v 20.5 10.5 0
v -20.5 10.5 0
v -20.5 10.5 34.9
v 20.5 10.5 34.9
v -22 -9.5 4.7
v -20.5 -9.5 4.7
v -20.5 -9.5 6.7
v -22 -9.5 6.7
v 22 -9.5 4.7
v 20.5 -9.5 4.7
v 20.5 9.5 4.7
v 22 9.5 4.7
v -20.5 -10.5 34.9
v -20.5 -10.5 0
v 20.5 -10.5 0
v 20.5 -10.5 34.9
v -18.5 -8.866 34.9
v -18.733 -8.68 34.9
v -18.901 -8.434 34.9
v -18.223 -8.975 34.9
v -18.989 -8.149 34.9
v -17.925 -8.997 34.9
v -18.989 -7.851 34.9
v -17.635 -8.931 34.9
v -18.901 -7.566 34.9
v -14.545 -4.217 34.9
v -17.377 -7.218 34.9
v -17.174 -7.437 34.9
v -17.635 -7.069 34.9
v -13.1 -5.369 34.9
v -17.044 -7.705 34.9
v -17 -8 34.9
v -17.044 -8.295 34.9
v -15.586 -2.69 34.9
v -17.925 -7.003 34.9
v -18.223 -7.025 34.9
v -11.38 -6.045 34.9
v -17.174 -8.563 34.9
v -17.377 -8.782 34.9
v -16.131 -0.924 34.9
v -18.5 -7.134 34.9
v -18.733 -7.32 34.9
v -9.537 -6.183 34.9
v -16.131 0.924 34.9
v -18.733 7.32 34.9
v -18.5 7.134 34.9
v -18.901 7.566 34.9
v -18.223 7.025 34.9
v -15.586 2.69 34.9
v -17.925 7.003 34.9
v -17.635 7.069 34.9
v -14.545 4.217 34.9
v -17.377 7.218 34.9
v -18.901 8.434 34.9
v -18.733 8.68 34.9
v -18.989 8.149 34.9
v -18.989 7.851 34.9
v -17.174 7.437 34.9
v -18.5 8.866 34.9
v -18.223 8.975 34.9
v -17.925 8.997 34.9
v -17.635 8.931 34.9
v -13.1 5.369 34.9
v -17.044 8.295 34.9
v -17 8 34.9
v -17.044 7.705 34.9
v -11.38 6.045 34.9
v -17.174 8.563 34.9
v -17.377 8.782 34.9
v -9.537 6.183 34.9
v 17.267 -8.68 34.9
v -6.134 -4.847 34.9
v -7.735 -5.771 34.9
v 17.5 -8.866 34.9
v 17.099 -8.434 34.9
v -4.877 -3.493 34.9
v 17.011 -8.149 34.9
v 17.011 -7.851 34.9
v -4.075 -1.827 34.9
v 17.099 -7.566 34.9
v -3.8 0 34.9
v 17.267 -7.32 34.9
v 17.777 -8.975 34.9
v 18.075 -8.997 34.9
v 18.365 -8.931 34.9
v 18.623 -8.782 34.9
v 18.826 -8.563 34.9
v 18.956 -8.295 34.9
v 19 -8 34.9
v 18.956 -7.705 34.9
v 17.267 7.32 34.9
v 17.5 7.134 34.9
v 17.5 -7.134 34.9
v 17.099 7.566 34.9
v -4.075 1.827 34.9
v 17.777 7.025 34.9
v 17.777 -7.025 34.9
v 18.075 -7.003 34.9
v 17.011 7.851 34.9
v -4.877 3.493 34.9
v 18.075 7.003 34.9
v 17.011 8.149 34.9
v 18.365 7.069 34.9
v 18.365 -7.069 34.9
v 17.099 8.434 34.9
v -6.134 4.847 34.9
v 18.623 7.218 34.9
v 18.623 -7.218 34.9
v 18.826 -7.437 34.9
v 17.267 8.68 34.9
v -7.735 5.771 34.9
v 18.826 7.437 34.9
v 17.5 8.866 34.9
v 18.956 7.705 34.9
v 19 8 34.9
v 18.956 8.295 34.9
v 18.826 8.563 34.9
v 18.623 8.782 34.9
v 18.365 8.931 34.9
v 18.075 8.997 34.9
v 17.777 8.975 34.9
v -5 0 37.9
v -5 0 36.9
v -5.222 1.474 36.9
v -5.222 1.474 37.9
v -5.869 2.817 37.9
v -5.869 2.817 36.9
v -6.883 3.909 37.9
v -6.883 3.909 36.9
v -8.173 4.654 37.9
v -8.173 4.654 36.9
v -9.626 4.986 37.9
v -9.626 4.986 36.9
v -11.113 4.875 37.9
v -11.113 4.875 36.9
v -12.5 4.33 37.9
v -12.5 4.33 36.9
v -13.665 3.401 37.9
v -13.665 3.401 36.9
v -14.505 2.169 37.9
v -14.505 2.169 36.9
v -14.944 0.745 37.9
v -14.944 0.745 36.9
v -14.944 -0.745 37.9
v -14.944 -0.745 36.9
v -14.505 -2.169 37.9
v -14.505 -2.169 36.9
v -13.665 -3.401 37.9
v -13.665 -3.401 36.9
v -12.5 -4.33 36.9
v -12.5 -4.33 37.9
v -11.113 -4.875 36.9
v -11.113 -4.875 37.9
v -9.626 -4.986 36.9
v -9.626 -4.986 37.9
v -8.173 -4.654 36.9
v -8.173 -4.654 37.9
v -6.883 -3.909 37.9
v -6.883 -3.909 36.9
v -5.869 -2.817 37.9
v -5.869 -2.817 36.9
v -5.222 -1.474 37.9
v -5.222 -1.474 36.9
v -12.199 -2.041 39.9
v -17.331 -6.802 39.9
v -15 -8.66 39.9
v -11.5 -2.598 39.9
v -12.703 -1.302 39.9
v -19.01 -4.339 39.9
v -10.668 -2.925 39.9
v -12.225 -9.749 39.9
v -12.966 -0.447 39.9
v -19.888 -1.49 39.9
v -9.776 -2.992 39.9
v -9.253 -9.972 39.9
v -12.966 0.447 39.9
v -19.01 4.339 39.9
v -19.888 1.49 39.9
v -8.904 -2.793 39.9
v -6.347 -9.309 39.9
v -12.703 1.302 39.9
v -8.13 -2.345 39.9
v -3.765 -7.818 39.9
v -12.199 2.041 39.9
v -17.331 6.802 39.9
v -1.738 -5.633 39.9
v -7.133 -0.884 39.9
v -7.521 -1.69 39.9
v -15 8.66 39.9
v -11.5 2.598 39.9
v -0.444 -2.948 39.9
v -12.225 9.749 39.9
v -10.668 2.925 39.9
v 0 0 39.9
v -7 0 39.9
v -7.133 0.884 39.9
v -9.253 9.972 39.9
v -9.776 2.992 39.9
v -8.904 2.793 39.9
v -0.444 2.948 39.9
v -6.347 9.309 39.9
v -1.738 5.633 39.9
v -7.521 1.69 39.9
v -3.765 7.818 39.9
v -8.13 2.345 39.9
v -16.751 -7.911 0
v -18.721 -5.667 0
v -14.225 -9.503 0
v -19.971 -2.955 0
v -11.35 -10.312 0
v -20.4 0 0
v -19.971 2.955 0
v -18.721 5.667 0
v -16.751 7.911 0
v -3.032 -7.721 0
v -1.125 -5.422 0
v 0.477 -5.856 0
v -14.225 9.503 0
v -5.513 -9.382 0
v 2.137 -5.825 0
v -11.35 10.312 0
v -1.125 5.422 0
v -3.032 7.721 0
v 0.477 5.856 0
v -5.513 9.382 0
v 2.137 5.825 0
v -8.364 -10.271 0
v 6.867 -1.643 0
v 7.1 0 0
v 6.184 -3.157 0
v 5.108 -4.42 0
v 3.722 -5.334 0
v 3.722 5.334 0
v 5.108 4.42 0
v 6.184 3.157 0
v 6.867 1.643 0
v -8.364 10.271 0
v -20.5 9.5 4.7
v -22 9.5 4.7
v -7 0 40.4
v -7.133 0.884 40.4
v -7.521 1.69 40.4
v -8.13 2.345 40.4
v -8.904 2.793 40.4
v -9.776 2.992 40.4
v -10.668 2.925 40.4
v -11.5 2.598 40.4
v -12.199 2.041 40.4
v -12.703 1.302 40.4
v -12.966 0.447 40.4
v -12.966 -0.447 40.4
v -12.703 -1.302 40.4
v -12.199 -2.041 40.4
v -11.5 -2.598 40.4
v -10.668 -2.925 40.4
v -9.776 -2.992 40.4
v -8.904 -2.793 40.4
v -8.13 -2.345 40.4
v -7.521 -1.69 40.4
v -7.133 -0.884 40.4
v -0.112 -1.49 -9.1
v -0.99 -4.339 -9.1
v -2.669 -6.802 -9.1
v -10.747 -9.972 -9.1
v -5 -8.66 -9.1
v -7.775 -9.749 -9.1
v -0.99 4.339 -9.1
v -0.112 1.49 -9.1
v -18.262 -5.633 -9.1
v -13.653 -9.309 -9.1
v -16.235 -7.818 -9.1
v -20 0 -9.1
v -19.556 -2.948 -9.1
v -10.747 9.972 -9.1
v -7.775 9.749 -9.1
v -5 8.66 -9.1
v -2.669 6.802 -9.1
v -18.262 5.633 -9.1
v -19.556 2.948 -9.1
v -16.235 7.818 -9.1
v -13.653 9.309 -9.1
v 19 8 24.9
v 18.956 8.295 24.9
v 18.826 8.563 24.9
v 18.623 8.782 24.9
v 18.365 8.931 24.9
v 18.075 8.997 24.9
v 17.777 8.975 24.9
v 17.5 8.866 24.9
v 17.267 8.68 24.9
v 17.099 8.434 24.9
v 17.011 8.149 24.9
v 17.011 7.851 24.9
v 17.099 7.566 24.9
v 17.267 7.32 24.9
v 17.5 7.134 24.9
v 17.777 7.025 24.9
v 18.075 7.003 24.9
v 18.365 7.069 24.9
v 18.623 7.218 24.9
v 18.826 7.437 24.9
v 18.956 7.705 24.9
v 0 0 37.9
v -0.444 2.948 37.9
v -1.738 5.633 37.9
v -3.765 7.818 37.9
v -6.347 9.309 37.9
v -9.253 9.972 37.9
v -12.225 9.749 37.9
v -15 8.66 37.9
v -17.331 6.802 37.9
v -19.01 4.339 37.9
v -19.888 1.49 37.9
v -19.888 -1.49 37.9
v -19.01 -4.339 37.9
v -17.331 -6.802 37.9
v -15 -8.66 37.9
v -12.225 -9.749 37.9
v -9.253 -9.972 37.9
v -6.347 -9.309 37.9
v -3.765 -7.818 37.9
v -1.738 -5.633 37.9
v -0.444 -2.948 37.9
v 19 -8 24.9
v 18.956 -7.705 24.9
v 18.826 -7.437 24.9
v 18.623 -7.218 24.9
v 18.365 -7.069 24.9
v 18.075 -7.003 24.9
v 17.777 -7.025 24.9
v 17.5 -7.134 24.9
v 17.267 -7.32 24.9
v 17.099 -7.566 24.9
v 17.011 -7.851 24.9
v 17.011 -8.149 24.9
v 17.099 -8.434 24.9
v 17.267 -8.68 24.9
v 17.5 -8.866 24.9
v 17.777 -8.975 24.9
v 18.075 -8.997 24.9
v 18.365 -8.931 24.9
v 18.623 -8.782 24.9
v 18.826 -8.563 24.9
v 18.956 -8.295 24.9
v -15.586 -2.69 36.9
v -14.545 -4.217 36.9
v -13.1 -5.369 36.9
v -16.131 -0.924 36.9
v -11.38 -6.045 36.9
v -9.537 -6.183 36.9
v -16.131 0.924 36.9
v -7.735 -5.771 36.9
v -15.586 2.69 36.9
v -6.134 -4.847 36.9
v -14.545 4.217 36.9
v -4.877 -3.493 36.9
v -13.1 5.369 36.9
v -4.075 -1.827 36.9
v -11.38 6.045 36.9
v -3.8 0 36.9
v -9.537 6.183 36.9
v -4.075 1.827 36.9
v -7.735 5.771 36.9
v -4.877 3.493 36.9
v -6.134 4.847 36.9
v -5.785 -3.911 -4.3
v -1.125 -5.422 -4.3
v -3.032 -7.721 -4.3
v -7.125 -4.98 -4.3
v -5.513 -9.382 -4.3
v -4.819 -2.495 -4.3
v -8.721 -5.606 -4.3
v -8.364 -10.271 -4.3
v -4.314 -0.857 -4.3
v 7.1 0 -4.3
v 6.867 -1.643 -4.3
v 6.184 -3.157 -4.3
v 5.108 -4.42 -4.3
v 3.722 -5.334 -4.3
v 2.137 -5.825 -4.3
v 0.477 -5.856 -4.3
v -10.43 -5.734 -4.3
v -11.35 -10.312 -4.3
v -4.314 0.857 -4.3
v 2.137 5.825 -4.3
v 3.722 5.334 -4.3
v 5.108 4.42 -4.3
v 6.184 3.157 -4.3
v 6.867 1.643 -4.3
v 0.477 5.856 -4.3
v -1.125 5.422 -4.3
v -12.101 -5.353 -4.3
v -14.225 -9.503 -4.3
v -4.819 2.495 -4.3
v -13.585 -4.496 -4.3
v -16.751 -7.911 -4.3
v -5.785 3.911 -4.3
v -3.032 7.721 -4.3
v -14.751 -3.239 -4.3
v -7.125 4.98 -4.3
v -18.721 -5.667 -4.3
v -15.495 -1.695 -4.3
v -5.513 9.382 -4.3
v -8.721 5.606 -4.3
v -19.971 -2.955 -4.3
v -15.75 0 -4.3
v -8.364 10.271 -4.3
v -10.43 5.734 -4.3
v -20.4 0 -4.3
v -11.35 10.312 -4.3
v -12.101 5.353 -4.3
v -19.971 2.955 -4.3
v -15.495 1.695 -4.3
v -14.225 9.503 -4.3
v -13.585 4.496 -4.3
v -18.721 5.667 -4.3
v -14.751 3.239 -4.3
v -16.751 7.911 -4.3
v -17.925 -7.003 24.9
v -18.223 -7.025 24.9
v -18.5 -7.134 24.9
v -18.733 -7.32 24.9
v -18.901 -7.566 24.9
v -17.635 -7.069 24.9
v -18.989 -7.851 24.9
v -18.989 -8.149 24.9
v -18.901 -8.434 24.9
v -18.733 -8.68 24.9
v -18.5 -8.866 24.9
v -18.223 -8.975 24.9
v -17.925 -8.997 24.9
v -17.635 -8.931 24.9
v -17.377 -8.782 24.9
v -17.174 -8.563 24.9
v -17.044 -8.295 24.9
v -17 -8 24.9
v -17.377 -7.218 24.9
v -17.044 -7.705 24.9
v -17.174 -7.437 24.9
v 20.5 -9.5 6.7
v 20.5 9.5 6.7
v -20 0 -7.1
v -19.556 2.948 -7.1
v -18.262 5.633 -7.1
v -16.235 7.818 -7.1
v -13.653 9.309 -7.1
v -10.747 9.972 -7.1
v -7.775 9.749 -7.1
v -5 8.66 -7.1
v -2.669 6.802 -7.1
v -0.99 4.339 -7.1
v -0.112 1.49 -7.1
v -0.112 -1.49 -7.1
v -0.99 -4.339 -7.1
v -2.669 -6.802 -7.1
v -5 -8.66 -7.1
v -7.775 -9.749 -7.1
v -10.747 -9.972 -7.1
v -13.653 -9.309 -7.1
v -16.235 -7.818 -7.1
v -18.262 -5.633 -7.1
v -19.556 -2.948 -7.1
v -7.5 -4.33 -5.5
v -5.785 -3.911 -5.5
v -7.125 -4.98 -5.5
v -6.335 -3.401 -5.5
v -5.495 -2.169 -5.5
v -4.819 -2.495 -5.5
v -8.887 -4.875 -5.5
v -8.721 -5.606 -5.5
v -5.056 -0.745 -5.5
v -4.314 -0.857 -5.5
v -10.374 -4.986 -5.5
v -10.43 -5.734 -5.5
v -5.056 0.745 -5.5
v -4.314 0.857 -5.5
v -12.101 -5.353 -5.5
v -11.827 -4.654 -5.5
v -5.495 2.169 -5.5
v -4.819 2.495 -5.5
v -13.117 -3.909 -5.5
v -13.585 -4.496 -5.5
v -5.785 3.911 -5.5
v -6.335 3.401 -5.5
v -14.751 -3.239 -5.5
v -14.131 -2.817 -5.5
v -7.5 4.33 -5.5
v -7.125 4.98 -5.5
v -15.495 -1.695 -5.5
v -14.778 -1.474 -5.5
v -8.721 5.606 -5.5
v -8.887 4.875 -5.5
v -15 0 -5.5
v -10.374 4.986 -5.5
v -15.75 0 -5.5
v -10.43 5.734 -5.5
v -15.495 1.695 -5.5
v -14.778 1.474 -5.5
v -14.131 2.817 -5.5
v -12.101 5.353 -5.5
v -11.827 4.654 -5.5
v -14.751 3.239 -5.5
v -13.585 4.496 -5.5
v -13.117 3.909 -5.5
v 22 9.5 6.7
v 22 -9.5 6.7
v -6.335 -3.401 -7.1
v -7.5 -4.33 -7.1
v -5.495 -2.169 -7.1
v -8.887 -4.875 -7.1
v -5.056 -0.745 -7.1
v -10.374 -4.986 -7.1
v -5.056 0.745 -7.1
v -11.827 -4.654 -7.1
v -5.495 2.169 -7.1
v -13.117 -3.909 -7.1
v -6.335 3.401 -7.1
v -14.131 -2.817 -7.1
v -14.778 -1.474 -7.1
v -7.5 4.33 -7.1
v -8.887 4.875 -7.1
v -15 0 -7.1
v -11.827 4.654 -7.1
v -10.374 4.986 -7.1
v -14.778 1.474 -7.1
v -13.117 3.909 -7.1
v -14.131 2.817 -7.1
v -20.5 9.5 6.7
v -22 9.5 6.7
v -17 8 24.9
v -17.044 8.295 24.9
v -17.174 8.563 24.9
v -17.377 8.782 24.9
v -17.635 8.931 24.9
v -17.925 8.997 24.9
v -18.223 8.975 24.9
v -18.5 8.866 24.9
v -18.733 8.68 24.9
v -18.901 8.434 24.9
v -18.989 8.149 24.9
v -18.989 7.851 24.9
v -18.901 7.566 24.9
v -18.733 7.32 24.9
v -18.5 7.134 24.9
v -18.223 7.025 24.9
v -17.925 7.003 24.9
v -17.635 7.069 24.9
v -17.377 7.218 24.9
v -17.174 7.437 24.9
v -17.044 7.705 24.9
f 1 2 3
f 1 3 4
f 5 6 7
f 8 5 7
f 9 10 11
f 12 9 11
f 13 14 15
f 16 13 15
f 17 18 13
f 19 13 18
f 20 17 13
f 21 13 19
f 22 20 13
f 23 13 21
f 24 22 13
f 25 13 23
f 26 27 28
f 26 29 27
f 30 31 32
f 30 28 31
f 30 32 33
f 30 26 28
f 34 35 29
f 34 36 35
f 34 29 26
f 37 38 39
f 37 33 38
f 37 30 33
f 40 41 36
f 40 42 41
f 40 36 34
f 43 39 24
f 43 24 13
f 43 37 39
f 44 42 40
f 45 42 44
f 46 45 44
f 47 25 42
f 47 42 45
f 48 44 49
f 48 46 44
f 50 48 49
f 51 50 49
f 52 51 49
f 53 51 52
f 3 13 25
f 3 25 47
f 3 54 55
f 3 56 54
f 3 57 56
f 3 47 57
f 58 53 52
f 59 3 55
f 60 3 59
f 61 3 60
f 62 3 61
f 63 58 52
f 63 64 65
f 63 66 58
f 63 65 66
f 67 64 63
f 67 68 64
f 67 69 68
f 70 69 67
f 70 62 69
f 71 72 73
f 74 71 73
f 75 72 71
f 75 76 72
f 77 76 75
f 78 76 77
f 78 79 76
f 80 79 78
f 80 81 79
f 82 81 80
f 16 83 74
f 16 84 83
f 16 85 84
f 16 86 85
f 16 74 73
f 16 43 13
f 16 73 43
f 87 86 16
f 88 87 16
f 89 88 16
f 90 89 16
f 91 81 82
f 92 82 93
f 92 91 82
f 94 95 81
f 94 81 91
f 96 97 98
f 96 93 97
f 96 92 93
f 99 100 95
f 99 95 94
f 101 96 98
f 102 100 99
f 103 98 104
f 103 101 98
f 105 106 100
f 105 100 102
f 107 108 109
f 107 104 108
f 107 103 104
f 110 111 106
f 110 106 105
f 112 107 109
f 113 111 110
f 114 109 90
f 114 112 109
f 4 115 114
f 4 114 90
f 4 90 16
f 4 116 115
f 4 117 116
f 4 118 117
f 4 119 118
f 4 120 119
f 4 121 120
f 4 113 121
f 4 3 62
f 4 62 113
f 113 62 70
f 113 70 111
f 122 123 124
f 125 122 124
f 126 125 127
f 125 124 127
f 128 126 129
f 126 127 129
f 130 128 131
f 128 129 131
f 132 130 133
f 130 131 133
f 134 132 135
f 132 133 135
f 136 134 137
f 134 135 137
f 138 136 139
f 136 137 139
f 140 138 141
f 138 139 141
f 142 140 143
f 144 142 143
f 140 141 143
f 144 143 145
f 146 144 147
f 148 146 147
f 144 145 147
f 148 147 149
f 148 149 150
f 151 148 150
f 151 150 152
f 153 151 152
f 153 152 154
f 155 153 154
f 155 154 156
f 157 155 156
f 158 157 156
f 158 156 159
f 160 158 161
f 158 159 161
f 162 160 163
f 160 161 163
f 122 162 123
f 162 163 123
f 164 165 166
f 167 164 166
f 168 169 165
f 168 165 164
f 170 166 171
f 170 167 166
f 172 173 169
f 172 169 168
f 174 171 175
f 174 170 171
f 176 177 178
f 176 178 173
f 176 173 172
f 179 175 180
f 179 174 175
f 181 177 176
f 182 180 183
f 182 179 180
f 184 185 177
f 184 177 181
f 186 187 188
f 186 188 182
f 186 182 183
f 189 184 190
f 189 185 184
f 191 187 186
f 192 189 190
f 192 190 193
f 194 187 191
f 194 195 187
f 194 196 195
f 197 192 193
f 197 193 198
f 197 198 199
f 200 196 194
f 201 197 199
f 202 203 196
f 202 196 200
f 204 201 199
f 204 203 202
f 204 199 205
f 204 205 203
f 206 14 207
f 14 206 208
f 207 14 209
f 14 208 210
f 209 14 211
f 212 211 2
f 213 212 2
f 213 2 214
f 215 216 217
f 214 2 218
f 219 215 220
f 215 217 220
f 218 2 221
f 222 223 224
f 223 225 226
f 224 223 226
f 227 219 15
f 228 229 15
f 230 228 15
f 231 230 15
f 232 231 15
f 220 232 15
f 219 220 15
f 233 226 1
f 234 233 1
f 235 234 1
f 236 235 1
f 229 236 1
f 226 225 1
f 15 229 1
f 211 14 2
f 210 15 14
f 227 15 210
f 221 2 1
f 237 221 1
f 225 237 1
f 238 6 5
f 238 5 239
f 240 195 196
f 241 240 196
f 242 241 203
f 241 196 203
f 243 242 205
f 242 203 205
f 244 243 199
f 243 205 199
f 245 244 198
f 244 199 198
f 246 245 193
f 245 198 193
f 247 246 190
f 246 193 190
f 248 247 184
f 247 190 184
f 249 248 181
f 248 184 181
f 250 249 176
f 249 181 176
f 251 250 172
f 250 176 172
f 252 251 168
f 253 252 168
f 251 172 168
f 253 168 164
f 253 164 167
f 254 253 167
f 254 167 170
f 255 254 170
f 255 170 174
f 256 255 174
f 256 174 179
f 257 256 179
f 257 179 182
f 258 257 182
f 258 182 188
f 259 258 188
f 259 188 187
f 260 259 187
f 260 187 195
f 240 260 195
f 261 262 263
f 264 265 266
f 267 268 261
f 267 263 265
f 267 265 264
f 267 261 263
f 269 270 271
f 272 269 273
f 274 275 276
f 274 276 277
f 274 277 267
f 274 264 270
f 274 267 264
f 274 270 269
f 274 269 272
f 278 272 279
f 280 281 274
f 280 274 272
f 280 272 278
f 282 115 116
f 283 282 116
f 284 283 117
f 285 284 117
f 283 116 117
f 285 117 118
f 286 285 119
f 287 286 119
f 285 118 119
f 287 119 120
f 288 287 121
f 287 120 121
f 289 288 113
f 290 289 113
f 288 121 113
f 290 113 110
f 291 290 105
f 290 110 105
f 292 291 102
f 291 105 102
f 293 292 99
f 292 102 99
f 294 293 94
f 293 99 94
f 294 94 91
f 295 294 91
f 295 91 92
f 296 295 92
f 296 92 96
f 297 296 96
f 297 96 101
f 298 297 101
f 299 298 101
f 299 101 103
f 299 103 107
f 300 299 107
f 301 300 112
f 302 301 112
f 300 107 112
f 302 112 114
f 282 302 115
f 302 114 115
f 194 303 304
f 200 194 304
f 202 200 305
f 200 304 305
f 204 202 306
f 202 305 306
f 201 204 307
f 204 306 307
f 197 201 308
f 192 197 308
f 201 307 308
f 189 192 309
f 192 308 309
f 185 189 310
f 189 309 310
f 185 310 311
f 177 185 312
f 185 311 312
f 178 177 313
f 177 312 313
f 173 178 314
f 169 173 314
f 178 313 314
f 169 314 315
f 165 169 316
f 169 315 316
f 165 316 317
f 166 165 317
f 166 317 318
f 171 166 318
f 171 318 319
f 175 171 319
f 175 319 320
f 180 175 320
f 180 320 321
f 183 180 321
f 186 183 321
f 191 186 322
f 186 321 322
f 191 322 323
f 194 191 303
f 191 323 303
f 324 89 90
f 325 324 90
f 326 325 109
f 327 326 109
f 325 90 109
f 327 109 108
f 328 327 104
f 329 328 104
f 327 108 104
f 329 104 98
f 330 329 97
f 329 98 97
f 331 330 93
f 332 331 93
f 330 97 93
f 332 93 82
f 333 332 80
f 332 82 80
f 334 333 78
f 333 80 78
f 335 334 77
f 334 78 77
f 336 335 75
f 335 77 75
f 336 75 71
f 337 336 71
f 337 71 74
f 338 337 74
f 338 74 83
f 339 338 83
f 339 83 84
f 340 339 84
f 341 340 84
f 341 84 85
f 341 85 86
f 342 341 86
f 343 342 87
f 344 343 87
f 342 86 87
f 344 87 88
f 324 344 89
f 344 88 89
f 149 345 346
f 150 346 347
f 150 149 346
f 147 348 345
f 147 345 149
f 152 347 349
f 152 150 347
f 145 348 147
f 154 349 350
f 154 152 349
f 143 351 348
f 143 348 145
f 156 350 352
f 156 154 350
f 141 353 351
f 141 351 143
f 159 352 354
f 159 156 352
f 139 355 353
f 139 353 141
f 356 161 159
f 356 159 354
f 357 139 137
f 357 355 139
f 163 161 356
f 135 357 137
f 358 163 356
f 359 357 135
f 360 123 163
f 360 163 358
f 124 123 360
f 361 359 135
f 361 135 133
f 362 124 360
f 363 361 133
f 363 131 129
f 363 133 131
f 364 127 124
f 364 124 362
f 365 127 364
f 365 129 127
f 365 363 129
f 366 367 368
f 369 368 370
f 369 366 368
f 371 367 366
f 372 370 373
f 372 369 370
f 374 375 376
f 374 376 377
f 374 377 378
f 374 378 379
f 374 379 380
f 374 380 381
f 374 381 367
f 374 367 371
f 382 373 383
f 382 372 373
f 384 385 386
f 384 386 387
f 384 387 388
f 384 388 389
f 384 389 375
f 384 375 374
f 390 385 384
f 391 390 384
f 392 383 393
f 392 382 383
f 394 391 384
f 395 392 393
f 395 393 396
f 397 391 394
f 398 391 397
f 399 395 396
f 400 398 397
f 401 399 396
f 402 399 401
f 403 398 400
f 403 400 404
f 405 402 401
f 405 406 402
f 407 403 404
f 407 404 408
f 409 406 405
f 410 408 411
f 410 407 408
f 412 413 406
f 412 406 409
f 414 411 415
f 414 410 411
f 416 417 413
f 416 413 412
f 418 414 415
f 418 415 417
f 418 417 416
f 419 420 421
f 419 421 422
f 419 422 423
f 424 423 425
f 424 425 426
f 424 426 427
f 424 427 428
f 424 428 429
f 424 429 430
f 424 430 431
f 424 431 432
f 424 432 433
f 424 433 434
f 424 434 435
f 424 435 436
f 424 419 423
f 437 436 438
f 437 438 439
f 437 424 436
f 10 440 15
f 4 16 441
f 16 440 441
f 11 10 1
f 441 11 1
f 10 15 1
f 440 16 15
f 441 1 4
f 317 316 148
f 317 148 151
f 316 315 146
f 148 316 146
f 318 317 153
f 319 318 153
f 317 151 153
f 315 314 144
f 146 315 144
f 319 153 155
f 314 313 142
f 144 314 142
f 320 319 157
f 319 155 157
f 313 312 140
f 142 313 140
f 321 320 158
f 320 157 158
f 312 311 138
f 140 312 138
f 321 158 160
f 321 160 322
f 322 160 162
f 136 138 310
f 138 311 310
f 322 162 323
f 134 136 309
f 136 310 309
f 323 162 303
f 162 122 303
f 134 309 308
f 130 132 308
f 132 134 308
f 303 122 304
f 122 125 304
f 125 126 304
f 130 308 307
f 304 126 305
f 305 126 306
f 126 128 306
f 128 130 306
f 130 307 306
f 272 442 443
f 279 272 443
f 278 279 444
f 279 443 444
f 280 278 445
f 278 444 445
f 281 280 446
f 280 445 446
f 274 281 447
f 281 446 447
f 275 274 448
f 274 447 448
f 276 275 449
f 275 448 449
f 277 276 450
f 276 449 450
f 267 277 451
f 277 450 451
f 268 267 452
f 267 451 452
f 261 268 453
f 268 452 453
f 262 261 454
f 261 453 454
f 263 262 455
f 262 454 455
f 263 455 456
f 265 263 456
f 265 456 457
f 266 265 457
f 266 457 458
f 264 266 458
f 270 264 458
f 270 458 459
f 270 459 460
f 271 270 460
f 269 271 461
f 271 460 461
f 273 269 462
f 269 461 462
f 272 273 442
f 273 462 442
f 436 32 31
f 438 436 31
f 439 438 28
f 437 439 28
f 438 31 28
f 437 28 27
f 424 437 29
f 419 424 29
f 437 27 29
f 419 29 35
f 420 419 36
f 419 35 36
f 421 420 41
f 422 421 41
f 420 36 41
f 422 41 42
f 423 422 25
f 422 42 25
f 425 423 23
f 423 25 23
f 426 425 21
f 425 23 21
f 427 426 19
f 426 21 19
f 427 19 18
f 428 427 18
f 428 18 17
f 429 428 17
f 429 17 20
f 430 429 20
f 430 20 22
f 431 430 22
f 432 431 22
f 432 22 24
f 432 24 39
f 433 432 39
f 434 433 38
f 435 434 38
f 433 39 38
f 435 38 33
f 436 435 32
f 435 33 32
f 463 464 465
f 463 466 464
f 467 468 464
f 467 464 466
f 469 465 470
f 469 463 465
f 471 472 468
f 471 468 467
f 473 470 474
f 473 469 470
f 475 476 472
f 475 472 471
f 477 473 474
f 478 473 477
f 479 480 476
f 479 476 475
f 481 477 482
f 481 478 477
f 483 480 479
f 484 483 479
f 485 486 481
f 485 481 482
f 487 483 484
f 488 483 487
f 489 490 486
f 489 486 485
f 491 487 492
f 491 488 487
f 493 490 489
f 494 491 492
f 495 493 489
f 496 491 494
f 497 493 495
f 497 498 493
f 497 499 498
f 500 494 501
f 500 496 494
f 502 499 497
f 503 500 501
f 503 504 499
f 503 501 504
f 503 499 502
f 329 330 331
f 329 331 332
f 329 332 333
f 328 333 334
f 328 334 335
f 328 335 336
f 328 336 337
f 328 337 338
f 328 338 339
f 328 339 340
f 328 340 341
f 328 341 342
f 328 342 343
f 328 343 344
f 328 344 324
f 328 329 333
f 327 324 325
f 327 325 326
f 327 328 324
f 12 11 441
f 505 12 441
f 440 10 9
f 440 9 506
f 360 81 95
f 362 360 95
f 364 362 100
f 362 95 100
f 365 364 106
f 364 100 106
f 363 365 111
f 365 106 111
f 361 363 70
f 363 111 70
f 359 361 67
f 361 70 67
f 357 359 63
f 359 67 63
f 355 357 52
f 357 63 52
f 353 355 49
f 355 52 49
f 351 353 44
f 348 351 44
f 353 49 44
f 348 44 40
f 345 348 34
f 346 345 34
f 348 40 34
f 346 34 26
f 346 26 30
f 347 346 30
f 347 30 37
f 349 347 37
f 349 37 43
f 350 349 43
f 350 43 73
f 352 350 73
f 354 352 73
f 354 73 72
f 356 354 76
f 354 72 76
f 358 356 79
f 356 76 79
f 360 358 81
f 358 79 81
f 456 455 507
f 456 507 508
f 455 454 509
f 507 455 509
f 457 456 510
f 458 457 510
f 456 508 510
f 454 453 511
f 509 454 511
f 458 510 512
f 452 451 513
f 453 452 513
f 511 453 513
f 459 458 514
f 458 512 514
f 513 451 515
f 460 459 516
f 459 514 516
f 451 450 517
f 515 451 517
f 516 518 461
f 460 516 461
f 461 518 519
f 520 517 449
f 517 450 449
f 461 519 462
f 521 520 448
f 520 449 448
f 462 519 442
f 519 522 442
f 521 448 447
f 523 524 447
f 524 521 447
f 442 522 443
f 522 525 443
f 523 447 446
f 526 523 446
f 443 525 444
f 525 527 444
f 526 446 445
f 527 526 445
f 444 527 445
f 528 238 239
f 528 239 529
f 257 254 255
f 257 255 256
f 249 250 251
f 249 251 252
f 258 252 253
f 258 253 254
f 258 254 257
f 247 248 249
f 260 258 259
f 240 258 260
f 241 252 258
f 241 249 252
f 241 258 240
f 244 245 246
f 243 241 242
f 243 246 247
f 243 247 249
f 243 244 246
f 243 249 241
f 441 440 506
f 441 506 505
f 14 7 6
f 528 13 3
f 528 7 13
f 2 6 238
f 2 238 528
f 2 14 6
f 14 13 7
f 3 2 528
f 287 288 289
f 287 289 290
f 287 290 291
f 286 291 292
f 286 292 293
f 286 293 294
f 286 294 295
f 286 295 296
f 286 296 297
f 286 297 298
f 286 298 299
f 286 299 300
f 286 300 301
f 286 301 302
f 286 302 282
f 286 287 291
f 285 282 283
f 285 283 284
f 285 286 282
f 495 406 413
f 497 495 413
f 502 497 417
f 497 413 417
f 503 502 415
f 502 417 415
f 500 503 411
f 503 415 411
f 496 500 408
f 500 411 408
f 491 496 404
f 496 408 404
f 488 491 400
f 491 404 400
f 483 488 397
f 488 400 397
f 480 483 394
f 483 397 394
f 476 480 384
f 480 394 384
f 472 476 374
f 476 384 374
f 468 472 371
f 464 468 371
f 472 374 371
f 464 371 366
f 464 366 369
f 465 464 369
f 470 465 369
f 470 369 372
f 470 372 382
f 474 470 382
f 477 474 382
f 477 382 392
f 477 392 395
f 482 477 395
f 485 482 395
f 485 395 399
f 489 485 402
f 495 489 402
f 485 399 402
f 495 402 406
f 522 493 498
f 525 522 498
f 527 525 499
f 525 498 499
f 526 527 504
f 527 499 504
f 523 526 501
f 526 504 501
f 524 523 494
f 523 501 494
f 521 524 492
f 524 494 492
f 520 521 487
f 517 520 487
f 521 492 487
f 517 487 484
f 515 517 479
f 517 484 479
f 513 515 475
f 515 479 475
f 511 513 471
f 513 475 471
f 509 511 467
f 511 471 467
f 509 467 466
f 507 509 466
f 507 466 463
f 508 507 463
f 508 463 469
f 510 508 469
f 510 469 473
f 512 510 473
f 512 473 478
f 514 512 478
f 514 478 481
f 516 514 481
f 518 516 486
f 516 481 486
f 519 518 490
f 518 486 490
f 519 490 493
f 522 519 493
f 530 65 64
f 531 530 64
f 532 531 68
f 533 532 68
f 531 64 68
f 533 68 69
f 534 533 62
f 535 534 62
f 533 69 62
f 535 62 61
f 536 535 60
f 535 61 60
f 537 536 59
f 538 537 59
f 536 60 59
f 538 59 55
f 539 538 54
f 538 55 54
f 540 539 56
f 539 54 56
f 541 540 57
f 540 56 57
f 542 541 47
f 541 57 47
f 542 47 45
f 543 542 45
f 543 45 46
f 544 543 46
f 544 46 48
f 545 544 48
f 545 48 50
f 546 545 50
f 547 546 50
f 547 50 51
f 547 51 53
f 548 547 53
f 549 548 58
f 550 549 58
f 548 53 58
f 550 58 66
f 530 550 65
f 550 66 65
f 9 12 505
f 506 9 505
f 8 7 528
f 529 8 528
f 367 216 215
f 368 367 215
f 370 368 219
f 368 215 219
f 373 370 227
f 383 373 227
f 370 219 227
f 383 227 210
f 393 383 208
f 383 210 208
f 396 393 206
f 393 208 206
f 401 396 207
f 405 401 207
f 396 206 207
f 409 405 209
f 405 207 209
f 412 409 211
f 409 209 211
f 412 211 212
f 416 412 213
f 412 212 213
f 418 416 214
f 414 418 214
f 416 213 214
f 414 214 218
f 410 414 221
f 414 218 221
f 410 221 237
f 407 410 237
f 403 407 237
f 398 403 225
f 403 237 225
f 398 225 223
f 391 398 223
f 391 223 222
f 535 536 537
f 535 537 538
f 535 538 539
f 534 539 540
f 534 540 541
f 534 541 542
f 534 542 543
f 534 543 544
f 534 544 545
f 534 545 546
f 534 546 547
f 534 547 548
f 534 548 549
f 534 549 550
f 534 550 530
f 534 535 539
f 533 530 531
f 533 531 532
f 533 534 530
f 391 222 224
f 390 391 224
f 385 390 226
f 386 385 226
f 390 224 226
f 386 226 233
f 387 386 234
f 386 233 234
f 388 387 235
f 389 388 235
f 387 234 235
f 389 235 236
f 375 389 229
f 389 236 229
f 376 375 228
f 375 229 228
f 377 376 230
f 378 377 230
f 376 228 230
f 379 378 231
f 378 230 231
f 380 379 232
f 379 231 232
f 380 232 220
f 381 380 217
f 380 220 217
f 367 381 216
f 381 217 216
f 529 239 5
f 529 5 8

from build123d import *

# Parameters (mm, degrees)
SKETCH_1_W          = 41
SKETCH_1_H          = 21
EXTRUDE_1_DEPTH     = 34.9
SKETCH_2_R          = 5.9
SKETCH_2_R_2        = 10.4
EXTRUDE_2_DEPTH     = 4.3
SKETCH_3_R          = 5.75
EXTRUDE_3_DEPTH     = 1.2
SKETCH_4_R          = 3
EXTRUDE_4_DEPTH     = 3.4
SKETCH_5_W          = 2
SKETCH_5_H          = 19
EXTRUDE_5_DEPTH     = 1.5
SKETCH_6_R          = 6.2
EXTRUDE_6_DEPTH     = 2
SKETCH_7_R          = 3
EXTRUDE_7_DEPTH     = 3.5
SKETCH_8_R          = 1
CUT_EXTRUDE_1_DEPTH = 10
SKETCH_9_R          = 5
EXTRUDE_8_DEPTH     = 1
SKETCH_10_R         = 10
EXTRUDE_9_DEPTH     = 2
SKETCH_11_R         = 5
EXTRUDE_10_DEPTH    = 1.6
SKETCH_12_R         = 10
EXTRUDE_11_DEPTH    = 2


with BuildPart() as part:
    # 草圖1 → 填料-伸長1 (new body)
    with BuildSketch(Plane.XY):
        Rectangle(SKETCH_1_W, SKETCH_1_H)
    extrude(amount=EXTRUDE_1_DEPTH)

    # 草圖2 → 填料-伸長2 (add)
    with BuildSketch(Plane(origin=(0, 0, 0), x_dir=(-1, 0, 0), z_dir=(0, 0, -1))):
        with Locations((-1.2, 0)):
            Circle(SKETCH_2_R)
        with Locations((10, 0)):
            Circle(SKETCH_2_R_2)
    extrude(amount=EXTRUDE_2_DEPTH)

    # 草圖3 → 填料-伸長3 (add)
    with BuildSketch(Plane(origin=(0, 0, -4.3), x_dir=(-1, 0, 0), z_dir=(0, 0, -1))):
        with Locations((10, 0)):
            Circle(SKETCH_3_R)
    extrude(amount=EXTRUDE_3_DEPTH)

    # 草圖4 → 填料-伸長4 (add)
    with BuildSketch(Plane(origin=(0, 0, -5.5), x_dir=(-1, 0, 0), z_dir=(0, 0, -1))):
        with Locations((10, 0)):
            Circle(SKETCH_4_R)
    extrude(amount=EXTRUDE_4_DEPTH)

    # 草圖5 → 填料-伸長5 (add)
    with BuildSketch(Plane.ZY.offset(20.5)):
        with Locations((5.7, 0)):
            Rectangle(SKETCH_5_W, SKETCH_5_H)
    extrude_5 = extrude(amount=EXTRUDE_5_DEPTH)

    # 鏡射1: 填料-伸長5 across plane
    add(extrude_5.mirror(Plane(origin=(0, 0, 0), x_dir=(0, 0, 1), z_dir=(1, 0, 0))))

    # 草圖6 → 填料-伸長6 (add)
    with BuildSketch(Plane.XY.offset(34.9)):
        with Locations((-10, 0)):
            Circle(SKETCH_6_R)
    extrude(amount=EXTRUDE_6_DEPTH)

    # 草圖7 → 填料-伸長7 (add)
    with BuildSketch(Plane.XY.offset(36.9)):
        with Locations((-10, 0)):
            Circle(SKETCH_7_R)
    extrude(amount=EXTRUDE_7_DEPTH)

    # 草圖8 → 除料-伸長1 (cut)
    with BuildSketch(Plane.XY.offset(34.9)):
        with Locations((-18, 8)):
            Circle(SKETCH_8_R)
        with Locations((18, 8)):
            Circle(SKETCH_8_R)
        with Locations((18, -8)):
            Circle(SKETCH_8_R)
        with Locations((-18, -8)):
            Circle(SKETCH_8_R)
    extrude(amount=-CUT_EXTRUDE_1_DEPTH, mode=Mode.SUBTRACT)

    # 草圖9 → 填料-伸長8 (add)
    with BuildSketch(Plane.XY.offset(36.9)):
        with Locations((-10, 0)):
            Circle(SKETCH_9_R)
    extrude(amount=EXTRUDE_8_DEPTH)

    # 草圖10 → 填料-伸長9 (add)
    with BuildSketch(Plane.XY.offset(37.9)):
        with Locations((-10, 0)):
            Circle(SKETCH_10_R)
    extrude(amount=EXTRUDE_9_DEPTH)

    # 草圖11 → 填料-伸長10 (add)
    with BuildSketch(Plane(origin=(0, 0, -5.5), x_dir=(-1, 0, 0), z_dir=(0, 0, -1))):
        with Locations((10, 0)):
            Circle(SKETCH_11_R)
    extrude(amount=EXTRUDE_10_DEPTH)

    # 草圖12 → 填料-伸長11 (add)
    with BuildSketch(Plane(origin=(0, 0, -7.1), x_dir=(-1, 0, 0), z_dir=(0, 0, -1))):
        with Locations((10, 0)):
            Circle(SKETCH_12_R)
    extrude(amount=EXTRUDE_11_DEPTH)


solid = part.part
